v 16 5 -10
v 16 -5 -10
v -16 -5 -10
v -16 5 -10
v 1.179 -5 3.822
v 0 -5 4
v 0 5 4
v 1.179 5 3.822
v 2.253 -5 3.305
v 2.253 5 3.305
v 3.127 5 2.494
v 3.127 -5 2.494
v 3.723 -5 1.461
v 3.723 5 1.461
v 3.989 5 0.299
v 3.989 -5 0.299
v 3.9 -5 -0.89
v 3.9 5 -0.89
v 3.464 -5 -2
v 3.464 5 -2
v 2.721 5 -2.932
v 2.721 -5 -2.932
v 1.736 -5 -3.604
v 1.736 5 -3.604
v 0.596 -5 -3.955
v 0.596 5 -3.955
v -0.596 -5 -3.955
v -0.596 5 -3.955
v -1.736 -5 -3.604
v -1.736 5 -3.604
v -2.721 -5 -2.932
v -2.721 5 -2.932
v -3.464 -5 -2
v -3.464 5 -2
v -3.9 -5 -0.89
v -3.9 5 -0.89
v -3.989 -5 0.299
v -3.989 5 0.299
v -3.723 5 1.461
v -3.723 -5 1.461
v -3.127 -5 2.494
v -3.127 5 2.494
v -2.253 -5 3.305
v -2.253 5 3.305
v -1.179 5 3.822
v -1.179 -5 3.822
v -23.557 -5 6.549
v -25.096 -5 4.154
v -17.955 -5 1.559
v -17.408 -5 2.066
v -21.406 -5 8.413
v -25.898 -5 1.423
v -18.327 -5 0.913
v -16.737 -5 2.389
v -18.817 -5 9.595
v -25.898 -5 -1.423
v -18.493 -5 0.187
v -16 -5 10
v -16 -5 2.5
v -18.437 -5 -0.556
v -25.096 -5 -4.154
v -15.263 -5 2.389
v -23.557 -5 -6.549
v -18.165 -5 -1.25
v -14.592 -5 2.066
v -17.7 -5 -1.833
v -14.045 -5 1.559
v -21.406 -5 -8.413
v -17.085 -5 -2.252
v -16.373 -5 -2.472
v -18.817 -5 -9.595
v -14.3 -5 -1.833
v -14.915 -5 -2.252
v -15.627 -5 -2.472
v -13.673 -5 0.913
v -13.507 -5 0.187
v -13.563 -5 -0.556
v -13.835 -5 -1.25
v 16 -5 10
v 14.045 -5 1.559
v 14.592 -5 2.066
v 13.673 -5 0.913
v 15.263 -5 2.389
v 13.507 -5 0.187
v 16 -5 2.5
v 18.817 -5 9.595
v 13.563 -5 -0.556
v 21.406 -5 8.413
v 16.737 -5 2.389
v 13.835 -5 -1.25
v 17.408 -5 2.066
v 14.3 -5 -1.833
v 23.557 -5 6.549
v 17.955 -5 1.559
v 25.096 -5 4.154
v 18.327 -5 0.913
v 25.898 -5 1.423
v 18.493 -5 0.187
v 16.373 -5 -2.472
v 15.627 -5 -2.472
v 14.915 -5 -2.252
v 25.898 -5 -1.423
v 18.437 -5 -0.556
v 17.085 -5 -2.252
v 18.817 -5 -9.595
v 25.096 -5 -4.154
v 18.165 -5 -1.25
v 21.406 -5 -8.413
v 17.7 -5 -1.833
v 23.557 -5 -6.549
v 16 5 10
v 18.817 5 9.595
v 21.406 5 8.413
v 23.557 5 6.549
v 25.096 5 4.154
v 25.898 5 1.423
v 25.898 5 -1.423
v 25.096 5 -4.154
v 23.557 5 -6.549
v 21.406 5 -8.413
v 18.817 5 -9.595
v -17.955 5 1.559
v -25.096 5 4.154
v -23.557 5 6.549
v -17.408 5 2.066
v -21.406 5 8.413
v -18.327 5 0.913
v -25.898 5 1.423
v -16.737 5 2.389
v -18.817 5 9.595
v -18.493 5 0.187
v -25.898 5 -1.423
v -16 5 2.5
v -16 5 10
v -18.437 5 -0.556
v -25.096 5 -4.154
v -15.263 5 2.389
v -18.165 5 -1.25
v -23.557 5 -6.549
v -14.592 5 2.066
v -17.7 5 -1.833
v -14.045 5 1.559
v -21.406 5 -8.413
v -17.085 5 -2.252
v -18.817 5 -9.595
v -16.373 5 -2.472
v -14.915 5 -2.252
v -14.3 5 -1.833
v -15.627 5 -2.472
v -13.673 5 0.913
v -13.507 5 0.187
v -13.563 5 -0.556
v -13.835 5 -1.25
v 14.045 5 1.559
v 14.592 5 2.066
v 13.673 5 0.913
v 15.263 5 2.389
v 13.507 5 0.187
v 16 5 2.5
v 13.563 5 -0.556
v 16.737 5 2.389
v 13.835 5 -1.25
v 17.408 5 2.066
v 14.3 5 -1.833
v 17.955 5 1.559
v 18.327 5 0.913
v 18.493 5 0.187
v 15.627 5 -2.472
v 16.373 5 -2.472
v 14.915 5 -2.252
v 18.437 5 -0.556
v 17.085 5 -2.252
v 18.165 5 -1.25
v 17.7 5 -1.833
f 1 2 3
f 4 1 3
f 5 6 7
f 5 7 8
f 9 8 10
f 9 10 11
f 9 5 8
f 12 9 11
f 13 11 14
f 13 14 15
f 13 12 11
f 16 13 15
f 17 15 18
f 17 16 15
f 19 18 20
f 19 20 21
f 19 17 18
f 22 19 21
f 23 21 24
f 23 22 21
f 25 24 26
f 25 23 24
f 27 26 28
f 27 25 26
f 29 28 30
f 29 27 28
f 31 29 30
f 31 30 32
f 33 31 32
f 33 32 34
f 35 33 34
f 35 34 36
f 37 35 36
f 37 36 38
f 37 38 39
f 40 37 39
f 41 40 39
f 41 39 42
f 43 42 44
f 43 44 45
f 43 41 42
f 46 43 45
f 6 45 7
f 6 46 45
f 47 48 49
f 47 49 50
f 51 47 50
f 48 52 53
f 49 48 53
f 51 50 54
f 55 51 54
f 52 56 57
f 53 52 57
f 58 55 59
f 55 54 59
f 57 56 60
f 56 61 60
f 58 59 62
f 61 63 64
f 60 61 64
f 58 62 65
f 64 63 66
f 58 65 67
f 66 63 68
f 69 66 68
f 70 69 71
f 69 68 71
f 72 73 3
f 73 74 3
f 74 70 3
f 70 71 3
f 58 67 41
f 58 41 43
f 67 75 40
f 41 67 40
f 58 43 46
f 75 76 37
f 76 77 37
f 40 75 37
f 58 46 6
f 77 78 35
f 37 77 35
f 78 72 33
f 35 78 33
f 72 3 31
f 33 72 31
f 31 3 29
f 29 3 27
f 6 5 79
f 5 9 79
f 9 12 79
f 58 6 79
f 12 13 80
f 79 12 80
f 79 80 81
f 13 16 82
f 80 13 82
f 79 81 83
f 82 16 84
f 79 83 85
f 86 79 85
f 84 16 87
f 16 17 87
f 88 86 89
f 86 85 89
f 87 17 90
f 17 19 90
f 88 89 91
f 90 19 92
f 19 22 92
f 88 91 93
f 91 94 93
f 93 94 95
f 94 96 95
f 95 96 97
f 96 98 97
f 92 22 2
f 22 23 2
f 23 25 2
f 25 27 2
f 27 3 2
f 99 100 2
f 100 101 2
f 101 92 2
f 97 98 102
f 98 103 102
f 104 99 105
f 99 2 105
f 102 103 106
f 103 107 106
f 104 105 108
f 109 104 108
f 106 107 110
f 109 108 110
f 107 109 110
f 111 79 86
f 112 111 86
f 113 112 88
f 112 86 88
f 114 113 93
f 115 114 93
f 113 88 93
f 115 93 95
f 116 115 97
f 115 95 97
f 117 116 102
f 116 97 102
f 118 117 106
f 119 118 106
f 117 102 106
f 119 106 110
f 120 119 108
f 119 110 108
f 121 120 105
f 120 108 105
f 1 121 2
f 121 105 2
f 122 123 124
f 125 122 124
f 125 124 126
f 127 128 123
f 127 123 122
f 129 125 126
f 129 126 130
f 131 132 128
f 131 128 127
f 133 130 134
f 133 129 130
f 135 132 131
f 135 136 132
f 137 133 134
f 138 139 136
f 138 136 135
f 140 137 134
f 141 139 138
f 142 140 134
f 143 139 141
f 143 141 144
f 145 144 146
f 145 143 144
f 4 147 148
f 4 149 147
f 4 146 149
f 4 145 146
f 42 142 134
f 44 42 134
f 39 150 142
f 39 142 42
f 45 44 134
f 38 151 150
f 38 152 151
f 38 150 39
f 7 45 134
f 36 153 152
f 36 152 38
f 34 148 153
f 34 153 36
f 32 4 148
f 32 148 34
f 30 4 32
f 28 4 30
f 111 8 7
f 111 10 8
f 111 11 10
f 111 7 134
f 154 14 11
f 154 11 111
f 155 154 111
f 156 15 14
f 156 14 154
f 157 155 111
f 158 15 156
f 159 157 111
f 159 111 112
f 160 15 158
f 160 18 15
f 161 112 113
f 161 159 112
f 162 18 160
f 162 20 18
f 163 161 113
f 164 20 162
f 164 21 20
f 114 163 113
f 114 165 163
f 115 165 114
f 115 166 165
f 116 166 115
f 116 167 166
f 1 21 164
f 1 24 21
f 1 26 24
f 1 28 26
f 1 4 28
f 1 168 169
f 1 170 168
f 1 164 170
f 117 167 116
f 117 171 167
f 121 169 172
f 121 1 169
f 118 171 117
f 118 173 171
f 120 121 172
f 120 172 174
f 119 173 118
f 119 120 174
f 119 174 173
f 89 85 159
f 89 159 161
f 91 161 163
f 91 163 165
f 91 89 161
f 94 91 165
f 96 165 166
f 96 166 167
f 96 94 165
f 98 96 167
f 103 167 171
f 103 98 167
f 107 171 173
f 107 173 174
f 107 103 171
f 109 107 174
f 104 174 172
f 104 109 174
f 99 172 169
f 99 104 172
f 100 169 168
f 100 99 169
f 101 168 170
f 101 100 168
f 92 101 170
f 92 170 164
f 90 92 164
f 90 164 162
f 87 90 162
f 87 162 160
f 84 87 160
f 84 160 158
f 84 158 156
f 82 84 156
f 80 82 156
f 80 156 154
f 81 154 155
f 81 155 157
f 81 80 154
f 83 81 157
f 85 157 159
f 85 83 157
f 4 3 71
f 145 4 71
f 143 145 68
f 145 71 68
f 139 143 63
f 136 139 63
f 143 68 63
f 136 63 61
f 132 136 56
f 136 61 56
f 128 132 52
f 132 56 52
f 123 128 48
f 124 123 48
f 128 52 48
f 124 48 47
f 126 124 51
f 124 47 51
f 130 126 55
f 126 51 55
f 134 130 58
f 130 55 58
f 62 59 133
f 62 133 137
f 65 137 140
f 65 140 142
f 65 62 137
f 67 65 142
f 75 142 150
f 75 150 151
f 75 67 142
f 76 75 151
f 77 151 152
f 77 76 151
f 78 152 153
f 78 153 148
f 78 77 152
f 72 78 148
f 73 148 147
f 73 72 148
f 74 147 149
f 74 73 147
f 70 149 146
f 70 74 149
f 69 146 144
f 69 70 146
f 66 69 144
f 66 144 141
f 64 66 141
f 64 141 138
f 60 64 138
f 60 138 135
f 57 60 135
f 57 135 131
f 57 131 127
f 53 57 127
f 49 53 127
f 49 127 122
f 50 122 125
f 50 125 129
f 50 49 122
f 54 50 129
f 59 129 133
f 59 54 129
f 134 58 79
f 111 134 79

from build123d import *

# Parameters (mm, degrees)
RESSALTO_EXTRUS_O1_DEPTH      = 5
RESSALTO_EXTRUS_O1_DEPTH_BACK = 5
CORTE_EXTRUS_O1_DEPTH         = 5
CORTE_EXTRUS_O1_DEPTH_BACK    = 5
ESBO_O1_R                     = 4
ESBO_O1_R_2                   = 2.5


with BuildPart() as part:
    # Esboço2 → Ressalto-extrusão1 (new, two sides: drawn at the far end of the back side and taken through both)
    with BuildSketch(Plane(origin=(0, 0, 0), x_dir=(1, 0, 0), z_dir=(0, 1, 0)).offset(-RESSALTO_EXTRUS_O1_DEPTH_BACK)):
        with BuildLine():
            Line((16, 10), (-16, 10))
            ThreePointArc((-16, 10), (-26, 0), (-16, -10))
            Line((-16, -10), (16, -10))
            ThreePointArc((16, -10), (26, 0), (16, 10))
        make_face()
    extrude(amount=RESSALTO_EXTRUS_O1_DEPTH + RESSALTO_EXTRUS_O1_DEPTH_BACK)

    # Esboço1 → Corte-extrusão1 (cut, two sides: drawn at the far end of the back side and taken through both)
    with BuildSketch(Plane(origin=(0, 0, 0), x_dir=(1, 0, 0), z_dir=(0, 1, 0)).offset(-CORTE_EXTRUS_O1_DEPTH_BACK)):
        Circle(ESBO_O1_R)
        with Locations((16, 0)):
            Circle(ESBO_O1_R_2)
        with Locations((-16, 0)):
            Circle(ESBO_O1_R_2)
    extrude(amount=CORTE_EXTRUS_O1_DEPTH + CORTE_EXTRUS_O1_DEPTH_BACK, mode=Mode.SUBTRACT)


solid = part.part
